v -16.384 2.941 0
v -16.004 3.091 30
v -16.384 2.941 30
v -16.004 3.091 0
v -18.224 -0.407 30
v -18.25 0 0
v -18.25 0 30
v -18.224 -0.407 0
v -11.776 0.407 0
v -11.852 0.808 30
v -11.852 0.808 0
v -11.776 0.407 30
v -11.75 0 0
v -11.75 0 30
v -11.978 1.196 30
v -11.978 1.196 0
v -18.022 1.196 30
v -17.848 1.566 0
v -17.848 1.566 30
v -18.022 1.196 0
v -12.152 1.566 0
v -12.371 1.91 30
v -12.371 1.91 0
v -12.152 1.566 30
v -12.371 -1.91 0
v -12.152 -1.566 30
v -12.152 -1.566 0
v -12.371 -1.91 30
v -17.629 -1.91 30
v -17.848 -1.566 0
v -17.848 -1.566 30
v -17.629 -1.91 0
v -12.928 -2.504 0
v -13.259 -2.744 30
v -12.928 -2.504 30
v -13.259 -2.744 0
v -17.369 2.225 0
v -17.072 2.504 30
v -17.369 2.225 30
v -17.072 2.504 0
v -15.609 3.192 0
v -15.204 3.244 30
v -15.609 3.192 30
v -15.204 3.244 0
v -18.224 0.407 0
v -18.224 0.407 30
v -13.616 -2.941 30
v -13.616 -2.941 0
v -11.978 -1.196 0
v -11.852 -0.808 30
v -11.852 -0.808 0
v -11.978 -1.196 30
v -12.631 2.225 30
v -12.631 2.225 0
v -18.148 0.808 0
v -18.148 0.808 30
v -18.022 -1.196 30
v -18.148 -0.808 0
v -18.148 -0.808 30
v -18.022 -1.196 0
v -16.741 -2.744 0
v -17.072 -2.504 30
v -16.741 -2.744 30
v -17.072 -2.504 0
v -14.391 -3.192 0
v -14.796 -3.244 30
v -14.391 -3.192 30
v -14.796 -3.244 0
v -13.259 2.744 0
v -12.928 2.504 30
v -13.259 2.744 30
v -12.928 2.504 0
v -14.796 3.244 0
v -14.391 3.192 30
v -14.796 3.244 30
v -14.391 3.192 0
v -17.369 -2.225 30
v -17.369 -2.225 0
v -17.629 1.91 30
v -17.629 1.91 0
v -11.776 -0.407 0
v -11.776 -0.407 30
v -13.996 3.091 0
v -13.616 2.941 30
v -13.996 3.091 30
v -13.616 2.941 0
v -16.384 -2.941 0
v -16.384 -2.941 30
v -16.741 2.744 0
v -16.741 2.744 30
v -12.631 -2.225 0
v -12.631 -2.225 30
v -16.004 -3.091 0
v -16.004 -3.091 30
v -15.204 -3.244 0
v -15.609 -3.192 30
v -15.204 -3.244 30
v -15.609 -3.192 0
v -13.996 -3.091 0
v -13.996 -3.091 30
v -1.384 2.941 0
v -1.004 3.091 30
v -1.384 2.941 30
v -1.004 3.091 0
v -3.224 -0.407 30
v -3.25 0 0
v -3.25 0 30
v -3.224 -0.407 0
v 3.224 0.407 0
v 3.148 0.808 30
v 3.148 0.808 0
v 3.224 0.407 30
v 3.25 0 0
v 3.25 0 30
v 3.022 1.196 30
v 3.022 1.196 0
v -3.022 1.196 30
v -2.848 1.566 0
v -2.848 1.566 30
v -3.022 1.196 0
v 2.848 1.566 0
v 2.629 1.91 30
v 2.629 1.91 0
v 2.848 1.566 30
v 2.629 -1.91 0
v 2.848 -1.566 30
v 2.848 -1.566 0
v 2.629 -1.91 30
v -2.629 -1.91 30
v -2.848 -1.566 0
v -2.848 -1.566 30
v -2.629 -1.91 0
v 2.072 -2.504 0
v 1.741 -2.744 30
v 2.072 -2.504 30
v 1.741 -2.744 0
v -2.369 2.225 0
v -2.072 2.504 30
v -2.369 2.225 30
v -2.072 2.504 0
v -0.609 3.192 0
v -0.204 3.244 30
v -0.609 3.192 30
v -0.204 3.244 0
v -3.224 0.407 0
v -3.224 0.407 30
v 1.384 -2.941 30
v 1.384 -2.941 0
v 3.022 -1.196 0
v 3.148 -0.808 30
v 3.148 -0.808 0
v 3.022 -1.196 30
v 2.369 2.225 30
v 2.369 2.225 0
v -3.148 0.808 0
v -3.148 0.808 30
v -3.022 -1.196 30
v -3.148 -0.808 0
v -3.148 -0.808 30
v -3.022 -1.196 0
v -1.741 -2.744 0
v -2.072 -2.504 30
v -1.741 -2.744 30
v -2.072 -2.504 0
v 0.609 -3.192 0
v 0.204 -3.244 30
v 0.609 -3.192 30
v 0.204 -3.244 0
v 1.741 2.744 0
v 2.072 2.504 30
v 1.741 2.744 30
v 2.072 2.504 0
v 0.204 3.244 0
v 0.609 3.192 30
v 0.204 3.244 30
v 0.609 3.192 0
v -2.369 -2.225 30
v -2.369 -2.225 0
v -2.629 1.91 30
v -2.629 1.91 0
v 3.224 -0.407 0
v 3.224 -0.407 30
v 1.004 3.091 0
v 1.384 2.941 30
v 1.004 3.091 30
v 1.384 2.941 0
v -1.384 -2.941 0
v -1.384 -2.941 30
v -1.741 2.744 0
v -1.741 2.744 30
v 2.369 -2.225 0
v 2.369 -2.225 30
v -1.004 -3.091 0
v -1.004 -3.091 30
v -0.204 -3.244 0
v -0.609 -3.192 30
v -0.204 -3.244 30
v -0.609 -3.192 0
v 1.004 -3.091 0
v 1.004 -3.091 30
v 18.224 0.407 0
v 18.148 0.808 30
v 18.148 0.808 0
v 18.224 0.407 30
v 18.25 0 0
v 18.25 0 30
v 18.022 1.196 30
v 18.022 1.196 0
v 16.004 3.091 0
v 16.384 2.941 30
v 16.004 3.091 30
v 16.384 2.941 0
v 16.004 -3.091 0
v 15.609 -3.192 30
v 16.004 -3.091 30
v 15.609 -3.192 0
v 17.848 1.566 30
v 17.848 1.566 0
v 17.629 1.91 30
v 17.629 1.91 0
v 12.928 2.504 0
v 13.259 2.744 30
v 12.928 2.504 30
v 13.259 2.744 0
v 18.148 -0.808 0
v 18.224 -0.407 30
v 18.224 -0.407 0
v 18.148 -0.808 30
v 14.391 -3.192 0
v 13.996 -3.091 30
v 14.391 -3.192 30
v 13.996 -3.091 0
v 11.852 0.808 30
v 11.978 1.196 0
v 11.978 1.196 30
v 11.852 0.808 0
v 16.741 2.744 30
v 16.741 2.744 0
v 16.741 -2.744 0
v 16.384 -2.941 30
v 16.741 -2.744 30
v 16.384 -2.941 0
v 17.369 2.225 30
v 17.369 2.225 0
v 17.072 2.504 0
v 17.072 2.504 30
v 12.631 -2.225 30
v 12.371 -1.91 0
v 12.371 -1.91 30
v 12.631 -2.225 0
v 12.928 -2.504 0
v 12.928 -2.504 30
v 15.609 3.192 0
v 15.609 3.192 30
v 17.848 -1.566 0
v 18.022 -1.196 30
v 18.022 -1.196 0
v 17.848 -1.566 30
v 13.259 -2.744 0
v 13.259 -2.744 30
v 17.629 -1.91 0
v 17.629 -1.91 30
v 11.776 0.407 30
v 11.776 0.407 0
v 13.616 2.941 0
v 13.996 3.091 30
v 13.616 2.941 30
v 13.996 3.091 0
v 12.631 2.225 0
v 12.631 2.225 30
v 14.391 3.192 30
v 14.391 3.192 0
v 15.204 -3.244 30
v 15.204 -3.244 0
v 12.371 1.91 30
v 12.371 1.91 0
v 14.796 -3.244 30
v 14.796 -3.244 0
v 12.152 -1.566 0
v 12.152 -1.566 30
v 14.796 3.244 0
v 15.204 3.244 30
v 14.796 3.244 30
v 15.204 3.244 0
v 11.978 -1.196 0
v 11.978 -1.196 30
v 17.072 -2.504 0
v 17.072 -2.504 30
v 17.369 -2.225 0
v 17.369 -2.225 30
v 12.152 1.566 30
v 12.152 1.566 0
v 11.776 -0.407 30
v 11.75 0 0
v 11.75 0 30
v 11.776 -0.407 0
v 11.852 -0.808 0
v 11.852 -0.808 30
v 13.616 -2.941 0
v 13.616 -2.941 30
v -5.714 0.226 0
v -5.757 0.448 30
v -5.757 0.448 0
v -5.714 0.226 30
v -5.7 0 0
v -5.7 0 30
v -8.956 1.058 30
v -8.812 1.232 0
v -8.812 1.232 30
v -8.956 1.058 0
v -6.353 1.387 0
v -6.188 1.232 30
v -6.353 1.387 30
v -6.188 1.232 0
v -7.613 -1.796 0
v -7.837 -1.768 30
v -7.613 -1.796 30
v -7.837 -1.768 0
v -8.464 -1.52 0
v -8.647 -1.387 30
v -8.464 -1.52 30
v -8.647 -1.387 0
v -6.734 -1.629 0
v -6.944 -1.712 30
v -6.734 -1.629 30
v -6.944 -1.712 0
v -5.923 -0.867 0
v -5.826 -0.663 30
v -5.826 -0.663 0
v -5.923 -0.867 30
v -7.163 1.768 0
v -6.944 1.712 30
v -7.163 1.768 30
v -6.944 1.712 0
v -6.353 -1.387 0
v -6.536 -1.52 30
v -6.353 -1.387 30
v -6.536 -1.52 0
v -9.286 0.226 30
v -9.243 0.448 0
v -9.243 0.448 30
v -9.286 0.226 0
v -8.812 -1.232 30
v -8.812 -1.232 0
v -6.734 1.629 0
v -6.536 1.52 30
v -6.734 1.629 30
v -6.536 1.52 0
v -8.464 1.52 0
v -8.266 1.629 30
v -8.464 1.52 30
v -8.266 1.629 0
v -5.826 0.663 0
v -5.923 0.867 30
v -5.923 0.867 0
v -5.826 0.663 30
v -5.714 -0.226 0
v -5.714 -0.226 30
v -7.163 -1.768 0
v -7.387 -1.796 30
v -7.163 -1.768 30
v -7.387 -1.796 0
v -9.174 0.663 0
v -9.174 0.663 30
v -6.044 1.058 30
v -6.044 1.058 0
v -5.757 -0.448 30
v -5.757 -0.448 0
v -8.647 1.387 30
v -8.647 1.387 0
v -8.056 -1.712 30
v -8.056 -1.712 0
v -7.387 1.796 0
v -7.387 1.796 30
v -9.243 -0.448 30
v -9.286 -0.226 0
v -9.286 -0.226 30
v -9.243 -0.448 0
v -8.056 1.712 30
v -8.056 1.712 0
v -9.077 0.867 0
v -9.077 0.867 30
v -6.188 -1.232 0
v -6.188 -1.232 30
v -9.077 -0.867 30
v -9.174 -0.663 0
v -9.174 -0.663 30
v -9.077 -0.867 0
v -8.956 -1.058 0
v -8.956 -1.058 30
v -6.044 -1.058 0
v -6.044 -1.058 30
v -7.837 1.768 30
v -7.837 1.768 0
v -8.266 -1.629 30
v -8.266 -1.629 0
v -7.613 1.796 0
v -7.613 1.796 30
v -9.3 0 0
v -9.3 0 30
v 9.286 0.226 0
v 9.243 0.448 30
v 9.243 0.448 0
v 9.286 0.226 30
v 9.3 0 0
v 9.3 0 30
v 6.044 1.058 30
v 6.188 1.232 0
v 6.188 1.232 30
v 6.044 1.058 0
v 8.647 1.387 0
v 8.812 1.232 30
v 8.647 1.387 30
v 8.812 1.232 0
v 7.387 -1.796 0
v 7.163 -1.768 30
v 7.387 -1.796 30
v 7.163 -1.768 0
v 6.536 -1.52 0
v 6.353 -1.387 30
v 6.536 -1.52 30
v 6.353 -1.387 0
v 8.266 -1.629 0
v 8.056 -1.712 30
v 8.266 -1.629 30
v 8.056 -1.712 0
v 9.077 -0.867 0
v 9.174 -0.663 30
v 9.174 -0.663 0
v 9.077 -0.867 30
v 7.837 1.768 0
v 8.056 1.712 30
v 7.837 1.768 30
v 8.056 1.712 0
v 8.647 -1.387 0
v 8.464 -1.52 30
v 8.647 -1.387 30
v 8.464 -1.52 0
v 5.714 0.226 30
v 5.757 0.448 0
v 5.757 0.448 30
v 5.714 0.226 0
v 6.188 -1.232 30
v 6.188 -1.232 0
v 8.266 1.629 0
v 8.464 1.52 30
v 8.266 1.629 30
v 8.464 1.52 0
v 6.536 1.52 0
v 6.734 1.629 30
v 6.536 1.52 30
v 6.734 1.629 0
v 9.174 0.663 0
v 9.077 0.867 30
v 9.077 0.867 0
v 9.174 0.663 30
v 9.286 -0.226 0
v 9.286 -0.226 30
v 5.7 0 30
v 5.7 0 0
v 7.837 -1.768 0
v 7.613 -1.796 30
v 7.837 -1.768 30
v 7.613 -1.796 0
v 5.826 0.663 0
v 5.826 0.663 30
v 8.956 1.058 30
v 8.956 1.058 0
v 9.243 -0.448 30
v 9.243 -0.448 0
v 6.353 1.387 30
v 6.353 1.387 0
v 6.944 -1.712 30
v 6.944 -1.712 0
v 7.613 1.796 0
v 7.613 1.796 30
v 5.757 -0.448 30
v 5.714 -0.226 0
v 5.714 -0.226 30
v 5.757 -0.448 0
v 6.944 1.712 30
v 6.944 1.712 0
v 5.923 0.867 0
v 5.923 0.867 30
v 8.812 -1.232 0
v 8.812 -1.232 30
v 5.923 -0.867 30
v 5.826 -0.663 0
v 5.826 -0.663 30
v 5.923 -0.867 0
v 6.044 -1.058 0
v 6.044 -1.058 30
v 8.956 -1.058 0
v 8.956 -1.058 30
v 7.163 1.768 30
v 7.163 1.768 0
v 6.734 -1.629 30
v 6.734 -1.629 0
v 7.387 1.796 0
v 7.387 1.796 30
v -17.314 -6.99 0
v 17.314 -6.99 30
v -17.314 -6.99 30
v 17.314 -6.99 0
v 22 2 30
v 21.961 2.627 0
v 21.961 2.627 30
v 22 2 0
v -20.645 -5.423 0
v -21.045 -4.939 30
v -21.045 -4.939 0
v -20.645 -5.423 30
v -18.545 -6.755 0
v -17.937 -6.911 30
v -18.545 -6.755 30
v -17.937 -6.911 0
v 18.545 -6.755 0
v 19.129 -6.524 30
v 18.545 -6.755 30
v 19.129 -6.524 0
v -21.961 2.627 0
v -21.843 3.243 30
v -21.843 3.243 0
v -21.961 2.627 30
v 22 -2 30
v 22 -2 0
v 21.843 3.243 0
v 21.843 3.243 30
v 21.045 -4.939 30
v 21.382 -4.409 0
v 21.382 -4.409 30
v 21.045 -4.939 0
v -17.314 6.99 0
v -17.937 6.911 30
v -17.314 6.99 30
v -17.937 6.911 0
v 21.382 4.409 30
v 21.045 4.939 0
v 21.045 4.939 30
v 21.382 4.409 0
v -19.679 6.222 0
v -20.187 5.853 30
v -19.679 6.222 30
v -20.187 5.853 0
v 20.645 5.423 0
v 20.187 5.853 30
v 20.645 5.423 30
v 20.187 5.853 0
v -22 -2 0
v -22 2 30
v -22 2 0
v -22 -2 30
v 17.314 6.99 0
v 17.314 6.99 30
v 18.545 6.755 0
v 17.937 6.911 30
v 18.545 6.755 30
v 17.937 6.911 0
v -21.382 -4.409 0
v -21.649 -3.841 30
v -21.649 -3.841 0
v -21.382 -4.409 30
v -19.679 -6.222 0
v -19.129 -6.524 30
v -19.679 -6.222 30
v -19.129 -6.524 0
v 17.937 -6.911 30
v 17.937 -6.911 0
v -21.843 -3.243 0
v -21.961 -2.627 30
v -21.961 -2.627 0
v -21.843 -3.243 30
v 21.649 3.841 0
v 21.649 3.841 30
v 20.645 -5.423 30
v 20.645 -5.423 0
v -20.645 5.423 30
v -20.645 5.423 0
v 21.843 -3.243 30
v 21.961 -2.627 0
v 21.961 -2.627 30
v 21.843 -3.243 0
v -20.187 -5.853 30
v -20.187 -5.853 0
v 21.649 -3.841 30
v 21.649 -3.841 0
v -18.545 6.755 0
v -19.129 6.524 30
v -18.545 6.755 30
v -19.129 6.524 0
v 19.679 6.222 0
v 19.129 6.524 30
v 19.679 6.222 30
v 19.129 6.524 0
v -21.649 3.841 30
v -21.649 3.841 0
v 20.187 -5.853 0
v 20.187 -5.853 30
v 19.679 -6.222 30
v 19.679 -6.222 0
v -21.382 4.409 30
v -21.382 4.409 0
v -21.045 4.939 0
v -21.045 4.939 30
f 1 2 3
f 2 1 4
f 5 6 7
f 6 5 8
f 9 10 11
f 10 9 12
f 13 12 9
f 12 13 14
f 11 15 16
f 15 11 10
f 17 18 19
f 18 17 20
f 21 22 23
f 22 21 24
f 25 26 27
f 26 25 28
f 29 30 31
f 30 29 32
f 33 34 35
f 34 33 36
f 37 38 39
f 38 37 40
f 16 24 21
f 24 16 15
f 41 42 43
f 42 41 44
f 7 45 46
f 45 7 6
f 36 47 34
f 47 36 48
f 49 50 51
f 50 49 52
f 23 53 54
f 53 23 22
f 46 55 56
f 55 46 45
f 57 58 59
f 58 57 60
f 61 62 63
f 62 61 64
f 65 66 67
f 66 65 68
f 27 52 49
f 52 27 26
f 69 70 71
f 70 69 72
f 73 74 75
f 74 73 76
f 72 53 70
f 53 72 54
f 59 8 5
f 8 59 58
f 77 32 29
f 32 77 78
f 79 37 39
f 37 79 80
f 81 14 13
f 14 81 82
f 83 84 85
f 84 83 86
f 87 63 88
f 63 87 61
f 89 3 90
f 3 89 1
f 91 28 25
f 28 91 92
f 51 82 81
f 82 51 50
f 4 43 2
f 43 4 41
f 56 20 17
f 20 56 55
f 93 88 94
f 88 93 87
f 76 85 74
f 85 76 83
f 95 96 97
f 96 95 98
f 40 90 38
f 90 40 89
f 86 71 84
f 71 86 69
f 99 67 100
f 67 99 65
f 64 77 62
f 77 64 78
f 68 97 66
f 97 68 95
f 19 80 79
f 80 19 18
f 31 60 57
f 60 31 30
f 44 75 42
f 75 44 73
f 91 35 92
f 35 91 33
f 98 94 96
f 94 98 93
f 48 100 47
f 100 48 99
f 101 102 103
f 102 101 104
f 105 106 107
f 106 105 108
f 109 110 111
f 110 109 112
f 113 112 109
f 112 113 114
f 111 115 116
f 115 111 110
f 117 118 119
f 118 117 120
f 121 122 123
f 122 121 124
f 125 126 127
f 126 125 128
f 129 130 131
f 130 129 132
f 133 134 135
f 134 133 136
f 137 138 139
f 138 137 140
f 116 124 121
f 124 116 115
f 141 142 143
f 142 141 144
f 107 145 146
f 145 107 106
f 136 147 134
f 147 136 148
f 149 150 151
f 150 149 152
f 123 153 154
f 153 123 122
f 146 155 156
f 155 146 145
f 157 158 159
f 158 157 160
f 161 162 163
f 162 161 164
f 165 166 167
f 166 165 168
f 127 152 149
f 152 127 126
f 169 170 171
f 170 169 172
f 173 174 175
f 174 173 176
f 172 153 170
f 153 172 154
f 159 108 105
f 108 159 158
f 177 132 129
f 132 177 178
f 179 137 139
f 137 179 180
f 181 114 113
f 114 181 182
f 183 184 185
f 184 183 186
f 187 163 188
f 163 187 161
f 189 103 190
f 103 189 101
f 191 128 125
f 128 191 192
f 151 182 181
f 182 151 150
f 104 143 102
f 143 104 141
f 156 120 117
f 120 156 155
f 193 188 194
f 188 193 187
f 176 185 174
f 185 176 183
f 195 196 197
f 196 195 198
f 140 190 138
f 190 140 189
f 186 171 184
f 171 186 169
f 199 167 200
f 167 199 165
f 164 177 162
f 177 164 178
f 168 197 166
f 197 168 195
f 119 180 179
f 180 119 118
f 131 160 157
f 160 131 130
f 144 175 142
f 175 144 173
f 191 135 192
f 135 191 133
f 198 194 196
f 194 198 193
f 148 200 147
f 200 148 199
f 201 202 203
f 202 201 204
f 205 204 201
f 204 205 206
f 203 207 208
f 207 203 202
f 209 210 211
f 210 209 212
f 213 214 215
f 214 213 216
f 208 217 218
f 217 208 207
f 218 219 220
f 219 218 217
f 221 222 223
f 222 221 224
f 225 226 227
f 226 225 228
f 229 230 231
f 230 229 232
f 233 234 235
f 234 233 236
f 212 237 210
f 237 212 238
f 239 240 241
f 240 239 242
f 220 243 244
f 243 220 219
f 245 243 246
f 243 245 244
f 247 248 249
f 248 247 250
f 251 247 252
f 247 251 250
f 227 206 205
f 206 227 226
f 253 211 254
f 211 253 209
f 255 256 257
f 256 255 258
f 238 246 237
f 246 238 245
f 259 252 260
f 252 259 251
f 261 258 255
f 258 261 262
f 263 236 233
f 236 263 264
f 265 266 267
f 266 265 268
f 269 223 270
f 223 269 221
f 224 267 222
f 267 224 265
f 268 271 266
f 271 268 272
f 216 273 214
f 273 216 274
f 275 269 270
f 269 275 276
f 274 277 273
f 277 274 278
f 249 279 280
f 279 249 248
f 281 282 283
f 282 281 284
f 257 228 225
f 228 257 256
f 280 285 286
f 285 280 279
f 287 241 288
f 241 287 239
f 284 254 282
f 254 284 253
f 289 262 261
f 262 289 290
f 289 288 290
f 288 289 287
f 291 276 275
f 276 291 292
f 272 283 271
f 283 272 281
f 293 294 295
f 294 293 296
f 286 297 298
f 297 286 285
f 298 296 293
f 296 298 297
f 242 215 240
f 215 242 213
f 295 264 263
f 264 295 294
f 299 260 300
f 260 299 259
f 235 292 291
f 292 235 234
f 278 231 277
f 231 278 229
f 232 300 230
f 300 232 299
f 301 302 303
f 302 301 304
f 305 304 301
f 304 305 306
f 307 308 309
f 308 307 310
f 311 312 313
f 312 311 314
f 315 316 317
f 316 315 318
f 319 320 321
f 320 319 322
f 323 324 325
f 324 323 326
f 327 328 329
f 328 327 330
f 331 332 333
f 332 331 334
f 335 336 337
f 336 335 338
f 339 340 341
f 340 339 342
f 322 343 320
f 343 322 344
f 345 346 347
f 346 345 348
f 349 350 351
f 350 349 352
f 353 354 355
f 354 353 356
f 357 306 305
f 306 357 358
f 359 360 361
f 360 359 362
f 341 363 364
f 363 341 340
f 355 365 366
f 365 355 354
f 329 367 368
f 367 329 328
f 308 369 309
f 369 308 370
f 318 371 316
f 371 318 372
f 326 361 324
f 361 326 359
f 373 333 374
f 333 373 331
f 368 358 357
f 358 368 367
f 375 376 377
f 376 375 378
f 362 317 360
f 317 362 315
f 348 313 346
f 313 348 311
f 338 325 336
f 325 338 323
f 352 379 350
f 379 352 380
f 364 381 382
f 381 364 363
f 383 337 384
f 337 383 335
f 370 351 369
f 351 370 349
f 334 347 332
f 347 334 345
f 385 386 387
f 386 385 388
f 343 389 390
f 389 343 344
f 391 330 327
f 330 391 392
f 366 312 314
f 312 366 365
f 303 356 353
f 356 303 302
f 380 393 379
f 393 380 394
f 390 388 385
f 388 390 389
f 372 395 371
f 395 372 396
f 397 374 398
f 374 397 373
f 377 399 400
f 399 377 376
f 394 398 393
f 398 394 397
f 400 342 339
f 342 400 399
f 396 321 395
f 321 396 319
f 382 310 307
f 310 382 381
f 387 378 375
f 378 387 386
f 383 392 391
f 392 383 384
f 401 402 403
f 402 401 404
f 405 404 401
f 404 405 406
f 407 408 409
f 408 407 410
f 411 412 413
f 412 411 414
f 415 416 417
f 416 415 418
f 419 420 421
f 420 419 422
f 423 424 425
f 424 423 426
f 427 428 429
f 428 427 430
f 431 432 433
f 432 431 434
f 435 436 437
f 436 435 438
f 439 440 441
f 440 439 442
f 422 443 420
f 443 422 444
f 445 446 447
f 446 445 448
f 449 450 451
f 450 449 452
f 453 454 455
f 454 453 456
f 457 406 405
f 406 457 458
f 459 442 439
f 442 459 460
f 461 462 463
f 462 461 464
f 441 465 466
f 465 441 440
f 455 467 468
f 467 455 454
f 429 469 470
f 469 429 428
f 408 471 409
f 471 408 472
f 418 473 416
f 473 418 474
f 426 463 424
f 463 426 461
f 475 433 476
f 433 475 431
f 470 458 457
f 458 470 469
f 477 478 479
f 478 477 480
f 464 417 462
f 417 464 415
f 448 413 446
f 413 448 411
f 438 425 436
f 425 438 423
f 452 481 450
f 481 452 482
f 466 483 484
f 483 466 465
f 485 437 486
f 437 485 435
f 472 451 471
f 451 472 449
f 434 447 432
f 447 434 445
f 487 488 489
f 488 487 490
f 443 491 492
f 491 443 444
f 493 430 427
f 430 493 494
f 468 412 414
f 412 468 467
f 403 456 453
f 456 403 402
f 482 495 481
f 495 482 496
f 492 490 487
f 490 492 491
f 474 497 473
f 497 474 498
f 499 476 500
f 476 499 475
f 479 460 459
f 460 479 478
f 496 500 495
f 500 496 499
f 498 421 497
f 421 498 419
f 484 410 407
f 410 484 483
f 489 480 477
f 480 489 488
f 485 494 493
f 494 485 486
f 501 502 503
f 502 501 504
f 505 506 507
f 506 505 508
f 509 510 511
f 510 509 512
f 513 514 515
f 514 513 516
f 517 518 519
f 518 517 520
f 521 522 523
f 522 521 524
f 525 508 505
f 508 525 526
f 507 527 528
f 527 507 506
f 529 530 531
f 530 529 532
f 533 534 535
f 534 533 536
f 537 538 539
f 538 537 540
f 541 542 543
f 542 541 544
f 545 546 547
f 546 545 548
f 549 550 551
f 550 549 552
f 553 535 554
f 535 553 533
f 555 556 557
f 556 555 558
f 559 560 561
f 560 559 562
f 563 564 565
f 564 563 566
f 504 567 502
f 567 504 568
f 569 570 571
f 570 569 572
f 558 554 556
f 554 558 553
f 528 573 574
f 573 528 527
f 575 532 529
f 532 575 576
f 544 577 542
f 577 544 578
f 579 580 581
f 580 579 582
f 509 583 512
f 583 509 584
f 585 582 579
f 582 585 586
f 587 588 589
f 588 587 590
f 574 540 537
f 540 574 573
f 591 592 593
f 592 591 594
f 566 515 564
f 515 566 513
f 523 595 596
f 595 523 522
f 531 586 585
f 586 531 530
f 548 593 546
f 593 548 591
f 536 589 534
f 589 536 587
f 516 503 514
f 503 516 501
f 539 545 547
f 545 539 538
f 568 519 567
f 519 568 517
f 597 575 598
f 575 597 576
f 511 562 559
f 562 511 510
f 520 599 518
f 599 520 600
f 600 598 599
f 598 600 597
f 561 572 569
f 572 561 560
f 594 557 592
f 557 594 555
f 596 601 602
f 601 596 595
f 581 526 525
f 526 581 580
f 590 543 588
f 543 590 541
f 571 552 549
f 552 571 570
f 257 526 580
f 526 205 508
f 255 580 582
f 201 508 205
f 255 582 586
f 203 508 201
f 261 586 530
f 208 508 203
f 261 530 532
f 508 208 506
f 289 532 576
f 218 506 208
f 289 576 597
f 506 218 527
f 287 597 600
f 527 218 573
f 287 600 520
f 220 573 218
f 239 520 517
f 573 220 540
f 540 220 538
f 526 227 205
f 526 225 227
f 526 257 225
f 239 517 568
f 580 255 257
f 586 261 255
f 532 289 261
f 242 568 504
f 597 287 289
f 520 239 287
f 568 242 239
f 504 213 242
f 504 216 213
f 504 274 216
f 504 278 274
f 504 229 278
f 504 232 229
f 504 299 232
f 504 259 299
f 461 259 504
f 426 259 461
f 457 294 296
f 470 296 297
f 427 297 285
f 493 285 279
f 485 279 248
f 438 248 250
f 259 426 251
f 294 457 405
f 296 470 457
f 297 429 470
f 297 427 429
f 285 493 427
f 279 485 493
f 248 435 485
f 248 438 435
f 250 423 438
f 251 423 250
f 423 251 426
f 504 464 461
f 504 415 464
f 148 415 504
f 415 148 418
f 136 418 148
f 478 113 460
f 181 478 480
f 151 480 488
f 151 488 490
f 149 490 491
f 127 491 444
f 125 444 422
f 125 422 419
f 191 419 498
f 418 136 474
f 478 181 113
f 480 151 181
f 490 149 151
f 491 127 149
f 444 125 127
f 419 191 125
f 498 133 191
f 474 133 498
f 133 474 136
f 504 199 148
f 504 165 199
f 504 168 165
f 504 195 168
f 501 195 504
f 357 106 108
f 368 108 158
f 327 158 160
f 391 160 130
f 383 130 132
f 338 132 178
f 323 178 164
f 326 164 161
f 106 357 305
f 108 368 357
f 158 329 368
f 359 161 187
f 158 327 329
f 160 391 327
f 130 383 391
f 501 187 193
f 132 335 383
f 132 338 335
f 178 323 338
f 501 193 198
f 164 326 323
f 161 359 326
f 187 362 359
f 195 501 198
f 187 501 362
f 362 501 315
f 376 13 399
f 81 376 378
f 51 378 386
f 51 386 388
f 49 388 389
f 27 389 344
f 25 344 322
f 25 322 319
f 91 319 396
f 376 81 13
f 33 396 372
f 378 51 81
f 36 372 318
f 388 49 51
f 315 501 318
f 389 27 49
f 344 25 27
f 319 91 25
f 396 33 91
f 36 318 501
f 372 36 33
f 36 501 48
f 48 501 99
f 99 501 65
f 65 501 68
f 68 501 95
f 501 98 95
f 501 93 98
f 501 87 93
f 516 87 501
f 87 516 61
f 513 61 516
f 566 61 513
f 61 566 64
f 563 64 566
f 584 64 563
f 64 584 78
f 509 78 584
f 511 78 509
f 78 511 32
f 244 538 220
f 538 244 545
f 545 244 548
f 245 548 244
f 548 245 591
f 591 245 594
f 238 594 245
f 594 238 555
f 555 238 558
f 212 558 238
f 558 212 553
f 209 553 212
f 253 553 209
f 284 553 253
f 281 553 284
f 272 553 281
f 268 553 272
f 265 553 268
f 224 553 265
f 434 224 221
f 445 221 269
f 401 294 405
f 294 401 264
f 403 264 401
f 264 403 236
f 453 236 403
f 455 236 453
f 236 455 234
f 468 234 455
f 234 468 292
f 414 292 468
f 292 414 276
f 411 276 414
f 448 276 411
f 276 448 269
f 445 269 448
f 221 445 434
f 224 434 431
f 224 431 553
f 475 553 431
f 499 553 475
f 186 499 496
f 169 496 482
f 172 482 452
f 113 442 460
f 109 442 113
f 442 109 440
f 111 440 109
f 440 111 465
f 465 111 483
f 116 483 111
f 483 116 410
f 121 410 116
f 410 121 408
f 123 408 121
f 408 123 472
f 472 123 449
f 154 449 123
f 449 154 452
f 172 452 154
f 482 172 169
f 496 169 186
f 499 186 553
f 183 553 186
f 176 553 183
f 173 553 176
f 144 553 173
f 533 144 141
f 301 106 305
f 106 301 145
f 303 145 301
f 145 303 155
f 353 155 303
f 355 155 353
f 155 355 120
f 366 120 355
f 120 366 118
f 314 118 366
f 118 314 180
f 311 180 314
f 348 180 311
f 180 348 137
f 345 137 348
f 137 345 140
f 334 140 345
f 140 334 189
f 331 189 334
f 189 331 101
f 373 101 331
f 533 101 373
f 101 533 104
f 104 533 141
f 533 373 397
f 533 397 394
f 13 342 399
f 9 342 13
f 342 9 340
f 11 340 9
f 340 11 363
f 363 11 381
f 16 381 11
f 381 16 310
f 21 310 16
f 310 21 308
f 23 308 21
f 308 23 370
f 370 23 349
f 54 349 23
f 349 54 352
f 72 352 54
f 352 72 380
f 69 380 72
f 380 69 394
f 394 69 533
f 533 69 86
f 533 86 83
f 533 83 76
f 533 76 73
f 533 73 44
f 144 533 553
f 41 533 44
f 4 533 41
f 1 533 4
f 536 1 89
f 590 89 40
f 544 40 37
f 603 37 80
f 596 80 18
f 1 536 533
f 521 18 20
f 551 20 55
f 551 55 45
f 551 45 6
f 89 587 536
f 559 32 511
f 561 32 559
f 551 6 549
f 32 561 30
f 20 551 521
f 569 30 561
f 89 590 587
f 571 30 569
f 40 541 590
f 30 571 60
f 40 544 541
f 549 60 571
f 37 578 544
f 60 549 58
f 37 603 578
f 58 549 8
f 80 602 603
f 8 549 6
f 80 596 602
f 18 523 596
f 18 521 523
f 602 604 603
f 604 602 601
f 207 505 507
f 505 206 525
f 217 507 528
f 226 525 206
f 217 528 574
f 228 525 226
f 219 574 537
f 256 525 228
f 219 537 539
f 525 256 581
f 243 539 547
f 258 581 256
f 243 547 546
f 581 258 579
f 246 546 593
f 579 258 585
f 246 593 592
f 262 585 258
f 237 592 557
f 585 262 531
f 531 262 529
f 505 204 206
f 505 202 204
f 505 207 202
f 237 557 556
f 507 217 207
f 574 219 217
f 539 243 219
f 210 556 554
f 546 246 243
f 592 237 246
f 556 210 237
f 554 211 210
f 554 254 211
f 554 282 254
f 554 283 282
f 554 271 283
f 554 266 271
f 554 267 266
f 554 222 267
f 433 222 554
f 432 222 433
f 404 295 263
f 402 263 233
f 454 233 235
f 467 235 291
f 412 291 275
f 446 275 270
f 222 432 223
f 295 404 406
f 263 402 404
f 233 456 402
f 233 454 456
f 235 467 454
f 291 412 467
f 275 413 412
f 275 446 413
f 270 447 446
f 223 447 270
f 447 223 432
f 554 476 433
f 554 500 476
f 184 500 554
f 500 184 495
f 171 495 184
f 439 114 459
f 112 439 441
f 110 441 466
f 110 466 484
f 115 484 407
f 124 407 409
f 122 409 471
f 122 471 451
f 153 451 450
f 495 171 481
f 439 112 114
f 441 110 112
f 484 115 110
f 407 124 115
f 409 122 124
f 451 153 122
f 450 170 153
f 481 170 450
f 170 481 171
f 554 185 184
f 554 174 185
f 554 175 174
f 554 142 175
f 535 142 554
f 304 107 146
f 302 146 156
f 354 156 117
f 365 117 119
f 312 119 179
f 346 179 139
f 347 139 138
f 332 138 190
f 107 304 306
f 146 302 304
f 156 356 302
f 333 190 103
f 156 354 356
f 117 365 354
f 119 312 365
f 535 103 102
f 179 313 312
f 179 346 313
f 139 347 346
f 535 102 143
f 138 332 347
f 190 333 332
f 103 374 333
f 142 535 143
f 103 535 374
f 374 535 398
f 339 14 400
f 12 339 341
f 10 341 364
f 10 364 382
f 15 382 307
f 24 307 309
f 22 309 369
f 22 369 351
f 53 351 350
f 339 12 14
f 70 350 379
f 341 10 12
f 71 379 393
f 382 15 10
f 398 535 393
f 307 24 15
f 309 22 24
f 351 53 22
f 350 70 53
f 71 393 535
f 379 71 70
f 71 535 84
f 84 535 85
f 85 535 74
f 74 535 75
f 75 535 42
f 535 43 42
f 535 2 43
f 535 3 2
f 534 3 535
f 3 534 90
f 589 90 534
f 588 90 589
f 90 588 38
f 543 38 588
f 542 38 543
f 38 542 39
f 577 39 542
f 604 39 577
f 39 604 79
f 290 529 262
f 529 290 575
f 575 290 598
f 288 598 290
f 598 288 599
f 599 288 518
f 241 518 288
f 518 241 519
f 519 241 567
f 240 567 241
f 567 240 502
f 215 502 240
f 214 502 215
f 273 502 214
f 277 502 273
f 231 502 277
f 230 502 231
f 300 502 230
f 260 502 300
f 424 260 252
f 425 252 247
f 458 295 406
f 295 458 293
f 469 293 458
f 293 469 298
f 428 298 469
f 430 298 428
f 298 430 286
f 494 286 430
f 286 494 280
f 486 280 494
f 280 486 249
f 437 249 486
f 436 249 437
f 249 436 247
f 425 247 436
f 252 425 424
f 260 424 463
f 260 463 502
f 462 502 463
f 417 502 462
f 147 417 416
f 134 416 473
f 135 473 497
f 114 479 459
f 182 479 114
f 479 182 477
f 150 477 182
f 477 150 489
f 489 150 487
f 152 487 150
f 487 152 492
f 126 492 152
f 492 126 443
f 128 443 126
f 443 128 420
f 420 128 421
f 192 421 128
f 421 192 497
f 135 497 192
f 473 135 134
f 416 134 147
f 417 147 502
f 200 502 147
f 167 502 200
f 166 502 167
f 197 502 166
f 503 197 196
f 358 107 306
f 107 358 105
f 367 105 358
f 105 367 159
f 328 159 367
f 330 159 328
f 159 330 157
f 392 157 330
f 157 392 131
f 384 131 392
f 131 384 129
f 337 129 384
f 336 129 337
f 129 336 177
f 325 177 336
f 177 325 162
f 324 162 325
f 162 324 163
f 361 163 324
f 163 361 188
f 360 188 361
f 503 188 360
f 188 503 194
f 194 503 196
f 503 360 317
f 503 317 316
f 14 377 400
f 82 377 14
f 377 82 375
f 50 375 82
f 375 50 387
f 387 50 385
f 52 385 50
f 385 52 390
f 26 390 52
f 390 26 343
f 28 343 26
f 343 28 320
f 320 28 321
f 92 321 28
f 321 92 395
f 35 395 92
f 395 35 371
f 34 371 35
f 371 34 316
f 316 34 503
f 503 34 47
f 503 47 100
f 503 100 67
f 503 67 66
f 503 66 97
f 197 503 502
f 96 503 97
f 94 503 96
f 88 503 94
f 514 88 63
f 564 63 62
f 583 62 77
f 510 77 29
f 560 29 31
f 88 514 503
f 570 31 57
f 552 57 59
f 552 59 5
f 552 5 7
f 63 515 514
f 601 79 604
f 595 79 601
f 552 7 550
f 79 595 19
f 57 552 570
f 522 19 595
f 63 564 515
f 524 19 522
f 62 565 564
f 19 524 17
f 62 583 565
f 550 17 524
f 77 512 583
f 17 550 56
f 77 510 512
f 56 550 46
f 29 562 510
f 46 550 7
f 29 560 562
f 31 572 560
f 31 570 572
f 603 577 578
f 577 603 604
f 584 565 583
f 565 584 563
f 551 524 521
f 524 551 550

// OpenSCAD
$fn = 50;


difference() {
	union() {
		*color(alpha = 1.0000000000, c = "gray") {
			translate(v = [0, 7, 0]) {
				linear_extrude(height = 1) {
					text(font = "Arial:style=Bold", halign = "center", size = 4.5000000000, text = "COMMENT plate main", valign = "center");
				}
			}
		}
		*color(alpha = 1.0000000000, c = "gray") {
			translate(v = [0, 14, 0]) {
				linear_extrude(height = 1) {
					text(font = "Arial:style=Bold", halign = "center", size = 4.5000000000, text = "COMMENT description oobb_plate_shape_p_type_30_depth_3_width_1_height_30_thickness_true_both_holes", valign = "center");
				}
			}
		}
		hull() {
			translate(v = [-17.0000000000, 2.0000000000, 0]) {
				cylinder(h = 30, r = 5);
			}
			translate(v = [17.0000000000, 2.0000000000, 0]) {
				cylinder(h = 30, r = 5);
			}
			translate(v = [-17.0000000000, -2.0000000000, 0]) {
				cylinder(h = 30, r = 5);
			}
			translate(v = [17.0000000000, -2.0000000000, 0]) {
				cylinder(h = 30, r = 5);
			}
		}
	}
	union() {
		*color(alpha = 1.0000000000, c = "gray") {
			translate(v = [0, 7, 0]) {
				linear_extrude(height = 1) {
					text(font = "Arial:style=Bold", halign = "center", size = 4.5000000000, text = "COMMENT holes main", valign = "center");
				}
			}
		}
		*color(alpha = 1.0000000000, c = "gray") {
			translate(v = [0, 14, 0]) {
				linear_extrude(height = 1) {
					text(font = "Arial:style=Bold", halign = "center", size = 4.5000000000, text = "COMMENT description oobb_holes_shape_n_type_3_width_1_height_30_thickness_true_both_holes", valign = "center");
				}
			}
		}
		translate(v = [-15.0000000000, 0.0000000000, 0]) {
			translate(v = [0, 0, -50]) {
				cylinder(h = 100, r = 3.2500000000);
			}
		}
		translate(v = [0, 0, -50]) {
			cylinder(h = 100, r = 3.2500000000);
		}
		translate(v = [15.0000000000, 0.0000000000, 0]) {
			translate(v = [0, 0, -50]) {
				cylinder(h = 100, r = 3.2500000000);
			}
		}
		translate(v = [-15.0000000000, 0.0000000000, 0]) {
			translate(v = [0, 0, -50]) {
				cylinder(h = 100, r = 1.8000000000);
			}
		}
		translate(v = [-7.5000000000, 0.0000000000, 0]) {
			translate(v = [0, 0, -50]) {
				cylinder(h = 100, r = 1.8000000000);
			}
		}
		translate(v = [0, 0, -50]) {
			cylinder(h = 100, r = 1.8000000000);
		}
		translate(v = [7.5000000000, 0.0000000000, 0]) {
			translate(v = [0, 0, -50]) {
				cylinder(h = 100, r = 1.8000000000);
			}
		}
		translate(v = [15.0000000000, 0.0000000000, 0]) {
			translate(v = [0, 0, -50]) {
				cylinder(h = 100, r = 1.8000000000);
			}
		}
	}
}
